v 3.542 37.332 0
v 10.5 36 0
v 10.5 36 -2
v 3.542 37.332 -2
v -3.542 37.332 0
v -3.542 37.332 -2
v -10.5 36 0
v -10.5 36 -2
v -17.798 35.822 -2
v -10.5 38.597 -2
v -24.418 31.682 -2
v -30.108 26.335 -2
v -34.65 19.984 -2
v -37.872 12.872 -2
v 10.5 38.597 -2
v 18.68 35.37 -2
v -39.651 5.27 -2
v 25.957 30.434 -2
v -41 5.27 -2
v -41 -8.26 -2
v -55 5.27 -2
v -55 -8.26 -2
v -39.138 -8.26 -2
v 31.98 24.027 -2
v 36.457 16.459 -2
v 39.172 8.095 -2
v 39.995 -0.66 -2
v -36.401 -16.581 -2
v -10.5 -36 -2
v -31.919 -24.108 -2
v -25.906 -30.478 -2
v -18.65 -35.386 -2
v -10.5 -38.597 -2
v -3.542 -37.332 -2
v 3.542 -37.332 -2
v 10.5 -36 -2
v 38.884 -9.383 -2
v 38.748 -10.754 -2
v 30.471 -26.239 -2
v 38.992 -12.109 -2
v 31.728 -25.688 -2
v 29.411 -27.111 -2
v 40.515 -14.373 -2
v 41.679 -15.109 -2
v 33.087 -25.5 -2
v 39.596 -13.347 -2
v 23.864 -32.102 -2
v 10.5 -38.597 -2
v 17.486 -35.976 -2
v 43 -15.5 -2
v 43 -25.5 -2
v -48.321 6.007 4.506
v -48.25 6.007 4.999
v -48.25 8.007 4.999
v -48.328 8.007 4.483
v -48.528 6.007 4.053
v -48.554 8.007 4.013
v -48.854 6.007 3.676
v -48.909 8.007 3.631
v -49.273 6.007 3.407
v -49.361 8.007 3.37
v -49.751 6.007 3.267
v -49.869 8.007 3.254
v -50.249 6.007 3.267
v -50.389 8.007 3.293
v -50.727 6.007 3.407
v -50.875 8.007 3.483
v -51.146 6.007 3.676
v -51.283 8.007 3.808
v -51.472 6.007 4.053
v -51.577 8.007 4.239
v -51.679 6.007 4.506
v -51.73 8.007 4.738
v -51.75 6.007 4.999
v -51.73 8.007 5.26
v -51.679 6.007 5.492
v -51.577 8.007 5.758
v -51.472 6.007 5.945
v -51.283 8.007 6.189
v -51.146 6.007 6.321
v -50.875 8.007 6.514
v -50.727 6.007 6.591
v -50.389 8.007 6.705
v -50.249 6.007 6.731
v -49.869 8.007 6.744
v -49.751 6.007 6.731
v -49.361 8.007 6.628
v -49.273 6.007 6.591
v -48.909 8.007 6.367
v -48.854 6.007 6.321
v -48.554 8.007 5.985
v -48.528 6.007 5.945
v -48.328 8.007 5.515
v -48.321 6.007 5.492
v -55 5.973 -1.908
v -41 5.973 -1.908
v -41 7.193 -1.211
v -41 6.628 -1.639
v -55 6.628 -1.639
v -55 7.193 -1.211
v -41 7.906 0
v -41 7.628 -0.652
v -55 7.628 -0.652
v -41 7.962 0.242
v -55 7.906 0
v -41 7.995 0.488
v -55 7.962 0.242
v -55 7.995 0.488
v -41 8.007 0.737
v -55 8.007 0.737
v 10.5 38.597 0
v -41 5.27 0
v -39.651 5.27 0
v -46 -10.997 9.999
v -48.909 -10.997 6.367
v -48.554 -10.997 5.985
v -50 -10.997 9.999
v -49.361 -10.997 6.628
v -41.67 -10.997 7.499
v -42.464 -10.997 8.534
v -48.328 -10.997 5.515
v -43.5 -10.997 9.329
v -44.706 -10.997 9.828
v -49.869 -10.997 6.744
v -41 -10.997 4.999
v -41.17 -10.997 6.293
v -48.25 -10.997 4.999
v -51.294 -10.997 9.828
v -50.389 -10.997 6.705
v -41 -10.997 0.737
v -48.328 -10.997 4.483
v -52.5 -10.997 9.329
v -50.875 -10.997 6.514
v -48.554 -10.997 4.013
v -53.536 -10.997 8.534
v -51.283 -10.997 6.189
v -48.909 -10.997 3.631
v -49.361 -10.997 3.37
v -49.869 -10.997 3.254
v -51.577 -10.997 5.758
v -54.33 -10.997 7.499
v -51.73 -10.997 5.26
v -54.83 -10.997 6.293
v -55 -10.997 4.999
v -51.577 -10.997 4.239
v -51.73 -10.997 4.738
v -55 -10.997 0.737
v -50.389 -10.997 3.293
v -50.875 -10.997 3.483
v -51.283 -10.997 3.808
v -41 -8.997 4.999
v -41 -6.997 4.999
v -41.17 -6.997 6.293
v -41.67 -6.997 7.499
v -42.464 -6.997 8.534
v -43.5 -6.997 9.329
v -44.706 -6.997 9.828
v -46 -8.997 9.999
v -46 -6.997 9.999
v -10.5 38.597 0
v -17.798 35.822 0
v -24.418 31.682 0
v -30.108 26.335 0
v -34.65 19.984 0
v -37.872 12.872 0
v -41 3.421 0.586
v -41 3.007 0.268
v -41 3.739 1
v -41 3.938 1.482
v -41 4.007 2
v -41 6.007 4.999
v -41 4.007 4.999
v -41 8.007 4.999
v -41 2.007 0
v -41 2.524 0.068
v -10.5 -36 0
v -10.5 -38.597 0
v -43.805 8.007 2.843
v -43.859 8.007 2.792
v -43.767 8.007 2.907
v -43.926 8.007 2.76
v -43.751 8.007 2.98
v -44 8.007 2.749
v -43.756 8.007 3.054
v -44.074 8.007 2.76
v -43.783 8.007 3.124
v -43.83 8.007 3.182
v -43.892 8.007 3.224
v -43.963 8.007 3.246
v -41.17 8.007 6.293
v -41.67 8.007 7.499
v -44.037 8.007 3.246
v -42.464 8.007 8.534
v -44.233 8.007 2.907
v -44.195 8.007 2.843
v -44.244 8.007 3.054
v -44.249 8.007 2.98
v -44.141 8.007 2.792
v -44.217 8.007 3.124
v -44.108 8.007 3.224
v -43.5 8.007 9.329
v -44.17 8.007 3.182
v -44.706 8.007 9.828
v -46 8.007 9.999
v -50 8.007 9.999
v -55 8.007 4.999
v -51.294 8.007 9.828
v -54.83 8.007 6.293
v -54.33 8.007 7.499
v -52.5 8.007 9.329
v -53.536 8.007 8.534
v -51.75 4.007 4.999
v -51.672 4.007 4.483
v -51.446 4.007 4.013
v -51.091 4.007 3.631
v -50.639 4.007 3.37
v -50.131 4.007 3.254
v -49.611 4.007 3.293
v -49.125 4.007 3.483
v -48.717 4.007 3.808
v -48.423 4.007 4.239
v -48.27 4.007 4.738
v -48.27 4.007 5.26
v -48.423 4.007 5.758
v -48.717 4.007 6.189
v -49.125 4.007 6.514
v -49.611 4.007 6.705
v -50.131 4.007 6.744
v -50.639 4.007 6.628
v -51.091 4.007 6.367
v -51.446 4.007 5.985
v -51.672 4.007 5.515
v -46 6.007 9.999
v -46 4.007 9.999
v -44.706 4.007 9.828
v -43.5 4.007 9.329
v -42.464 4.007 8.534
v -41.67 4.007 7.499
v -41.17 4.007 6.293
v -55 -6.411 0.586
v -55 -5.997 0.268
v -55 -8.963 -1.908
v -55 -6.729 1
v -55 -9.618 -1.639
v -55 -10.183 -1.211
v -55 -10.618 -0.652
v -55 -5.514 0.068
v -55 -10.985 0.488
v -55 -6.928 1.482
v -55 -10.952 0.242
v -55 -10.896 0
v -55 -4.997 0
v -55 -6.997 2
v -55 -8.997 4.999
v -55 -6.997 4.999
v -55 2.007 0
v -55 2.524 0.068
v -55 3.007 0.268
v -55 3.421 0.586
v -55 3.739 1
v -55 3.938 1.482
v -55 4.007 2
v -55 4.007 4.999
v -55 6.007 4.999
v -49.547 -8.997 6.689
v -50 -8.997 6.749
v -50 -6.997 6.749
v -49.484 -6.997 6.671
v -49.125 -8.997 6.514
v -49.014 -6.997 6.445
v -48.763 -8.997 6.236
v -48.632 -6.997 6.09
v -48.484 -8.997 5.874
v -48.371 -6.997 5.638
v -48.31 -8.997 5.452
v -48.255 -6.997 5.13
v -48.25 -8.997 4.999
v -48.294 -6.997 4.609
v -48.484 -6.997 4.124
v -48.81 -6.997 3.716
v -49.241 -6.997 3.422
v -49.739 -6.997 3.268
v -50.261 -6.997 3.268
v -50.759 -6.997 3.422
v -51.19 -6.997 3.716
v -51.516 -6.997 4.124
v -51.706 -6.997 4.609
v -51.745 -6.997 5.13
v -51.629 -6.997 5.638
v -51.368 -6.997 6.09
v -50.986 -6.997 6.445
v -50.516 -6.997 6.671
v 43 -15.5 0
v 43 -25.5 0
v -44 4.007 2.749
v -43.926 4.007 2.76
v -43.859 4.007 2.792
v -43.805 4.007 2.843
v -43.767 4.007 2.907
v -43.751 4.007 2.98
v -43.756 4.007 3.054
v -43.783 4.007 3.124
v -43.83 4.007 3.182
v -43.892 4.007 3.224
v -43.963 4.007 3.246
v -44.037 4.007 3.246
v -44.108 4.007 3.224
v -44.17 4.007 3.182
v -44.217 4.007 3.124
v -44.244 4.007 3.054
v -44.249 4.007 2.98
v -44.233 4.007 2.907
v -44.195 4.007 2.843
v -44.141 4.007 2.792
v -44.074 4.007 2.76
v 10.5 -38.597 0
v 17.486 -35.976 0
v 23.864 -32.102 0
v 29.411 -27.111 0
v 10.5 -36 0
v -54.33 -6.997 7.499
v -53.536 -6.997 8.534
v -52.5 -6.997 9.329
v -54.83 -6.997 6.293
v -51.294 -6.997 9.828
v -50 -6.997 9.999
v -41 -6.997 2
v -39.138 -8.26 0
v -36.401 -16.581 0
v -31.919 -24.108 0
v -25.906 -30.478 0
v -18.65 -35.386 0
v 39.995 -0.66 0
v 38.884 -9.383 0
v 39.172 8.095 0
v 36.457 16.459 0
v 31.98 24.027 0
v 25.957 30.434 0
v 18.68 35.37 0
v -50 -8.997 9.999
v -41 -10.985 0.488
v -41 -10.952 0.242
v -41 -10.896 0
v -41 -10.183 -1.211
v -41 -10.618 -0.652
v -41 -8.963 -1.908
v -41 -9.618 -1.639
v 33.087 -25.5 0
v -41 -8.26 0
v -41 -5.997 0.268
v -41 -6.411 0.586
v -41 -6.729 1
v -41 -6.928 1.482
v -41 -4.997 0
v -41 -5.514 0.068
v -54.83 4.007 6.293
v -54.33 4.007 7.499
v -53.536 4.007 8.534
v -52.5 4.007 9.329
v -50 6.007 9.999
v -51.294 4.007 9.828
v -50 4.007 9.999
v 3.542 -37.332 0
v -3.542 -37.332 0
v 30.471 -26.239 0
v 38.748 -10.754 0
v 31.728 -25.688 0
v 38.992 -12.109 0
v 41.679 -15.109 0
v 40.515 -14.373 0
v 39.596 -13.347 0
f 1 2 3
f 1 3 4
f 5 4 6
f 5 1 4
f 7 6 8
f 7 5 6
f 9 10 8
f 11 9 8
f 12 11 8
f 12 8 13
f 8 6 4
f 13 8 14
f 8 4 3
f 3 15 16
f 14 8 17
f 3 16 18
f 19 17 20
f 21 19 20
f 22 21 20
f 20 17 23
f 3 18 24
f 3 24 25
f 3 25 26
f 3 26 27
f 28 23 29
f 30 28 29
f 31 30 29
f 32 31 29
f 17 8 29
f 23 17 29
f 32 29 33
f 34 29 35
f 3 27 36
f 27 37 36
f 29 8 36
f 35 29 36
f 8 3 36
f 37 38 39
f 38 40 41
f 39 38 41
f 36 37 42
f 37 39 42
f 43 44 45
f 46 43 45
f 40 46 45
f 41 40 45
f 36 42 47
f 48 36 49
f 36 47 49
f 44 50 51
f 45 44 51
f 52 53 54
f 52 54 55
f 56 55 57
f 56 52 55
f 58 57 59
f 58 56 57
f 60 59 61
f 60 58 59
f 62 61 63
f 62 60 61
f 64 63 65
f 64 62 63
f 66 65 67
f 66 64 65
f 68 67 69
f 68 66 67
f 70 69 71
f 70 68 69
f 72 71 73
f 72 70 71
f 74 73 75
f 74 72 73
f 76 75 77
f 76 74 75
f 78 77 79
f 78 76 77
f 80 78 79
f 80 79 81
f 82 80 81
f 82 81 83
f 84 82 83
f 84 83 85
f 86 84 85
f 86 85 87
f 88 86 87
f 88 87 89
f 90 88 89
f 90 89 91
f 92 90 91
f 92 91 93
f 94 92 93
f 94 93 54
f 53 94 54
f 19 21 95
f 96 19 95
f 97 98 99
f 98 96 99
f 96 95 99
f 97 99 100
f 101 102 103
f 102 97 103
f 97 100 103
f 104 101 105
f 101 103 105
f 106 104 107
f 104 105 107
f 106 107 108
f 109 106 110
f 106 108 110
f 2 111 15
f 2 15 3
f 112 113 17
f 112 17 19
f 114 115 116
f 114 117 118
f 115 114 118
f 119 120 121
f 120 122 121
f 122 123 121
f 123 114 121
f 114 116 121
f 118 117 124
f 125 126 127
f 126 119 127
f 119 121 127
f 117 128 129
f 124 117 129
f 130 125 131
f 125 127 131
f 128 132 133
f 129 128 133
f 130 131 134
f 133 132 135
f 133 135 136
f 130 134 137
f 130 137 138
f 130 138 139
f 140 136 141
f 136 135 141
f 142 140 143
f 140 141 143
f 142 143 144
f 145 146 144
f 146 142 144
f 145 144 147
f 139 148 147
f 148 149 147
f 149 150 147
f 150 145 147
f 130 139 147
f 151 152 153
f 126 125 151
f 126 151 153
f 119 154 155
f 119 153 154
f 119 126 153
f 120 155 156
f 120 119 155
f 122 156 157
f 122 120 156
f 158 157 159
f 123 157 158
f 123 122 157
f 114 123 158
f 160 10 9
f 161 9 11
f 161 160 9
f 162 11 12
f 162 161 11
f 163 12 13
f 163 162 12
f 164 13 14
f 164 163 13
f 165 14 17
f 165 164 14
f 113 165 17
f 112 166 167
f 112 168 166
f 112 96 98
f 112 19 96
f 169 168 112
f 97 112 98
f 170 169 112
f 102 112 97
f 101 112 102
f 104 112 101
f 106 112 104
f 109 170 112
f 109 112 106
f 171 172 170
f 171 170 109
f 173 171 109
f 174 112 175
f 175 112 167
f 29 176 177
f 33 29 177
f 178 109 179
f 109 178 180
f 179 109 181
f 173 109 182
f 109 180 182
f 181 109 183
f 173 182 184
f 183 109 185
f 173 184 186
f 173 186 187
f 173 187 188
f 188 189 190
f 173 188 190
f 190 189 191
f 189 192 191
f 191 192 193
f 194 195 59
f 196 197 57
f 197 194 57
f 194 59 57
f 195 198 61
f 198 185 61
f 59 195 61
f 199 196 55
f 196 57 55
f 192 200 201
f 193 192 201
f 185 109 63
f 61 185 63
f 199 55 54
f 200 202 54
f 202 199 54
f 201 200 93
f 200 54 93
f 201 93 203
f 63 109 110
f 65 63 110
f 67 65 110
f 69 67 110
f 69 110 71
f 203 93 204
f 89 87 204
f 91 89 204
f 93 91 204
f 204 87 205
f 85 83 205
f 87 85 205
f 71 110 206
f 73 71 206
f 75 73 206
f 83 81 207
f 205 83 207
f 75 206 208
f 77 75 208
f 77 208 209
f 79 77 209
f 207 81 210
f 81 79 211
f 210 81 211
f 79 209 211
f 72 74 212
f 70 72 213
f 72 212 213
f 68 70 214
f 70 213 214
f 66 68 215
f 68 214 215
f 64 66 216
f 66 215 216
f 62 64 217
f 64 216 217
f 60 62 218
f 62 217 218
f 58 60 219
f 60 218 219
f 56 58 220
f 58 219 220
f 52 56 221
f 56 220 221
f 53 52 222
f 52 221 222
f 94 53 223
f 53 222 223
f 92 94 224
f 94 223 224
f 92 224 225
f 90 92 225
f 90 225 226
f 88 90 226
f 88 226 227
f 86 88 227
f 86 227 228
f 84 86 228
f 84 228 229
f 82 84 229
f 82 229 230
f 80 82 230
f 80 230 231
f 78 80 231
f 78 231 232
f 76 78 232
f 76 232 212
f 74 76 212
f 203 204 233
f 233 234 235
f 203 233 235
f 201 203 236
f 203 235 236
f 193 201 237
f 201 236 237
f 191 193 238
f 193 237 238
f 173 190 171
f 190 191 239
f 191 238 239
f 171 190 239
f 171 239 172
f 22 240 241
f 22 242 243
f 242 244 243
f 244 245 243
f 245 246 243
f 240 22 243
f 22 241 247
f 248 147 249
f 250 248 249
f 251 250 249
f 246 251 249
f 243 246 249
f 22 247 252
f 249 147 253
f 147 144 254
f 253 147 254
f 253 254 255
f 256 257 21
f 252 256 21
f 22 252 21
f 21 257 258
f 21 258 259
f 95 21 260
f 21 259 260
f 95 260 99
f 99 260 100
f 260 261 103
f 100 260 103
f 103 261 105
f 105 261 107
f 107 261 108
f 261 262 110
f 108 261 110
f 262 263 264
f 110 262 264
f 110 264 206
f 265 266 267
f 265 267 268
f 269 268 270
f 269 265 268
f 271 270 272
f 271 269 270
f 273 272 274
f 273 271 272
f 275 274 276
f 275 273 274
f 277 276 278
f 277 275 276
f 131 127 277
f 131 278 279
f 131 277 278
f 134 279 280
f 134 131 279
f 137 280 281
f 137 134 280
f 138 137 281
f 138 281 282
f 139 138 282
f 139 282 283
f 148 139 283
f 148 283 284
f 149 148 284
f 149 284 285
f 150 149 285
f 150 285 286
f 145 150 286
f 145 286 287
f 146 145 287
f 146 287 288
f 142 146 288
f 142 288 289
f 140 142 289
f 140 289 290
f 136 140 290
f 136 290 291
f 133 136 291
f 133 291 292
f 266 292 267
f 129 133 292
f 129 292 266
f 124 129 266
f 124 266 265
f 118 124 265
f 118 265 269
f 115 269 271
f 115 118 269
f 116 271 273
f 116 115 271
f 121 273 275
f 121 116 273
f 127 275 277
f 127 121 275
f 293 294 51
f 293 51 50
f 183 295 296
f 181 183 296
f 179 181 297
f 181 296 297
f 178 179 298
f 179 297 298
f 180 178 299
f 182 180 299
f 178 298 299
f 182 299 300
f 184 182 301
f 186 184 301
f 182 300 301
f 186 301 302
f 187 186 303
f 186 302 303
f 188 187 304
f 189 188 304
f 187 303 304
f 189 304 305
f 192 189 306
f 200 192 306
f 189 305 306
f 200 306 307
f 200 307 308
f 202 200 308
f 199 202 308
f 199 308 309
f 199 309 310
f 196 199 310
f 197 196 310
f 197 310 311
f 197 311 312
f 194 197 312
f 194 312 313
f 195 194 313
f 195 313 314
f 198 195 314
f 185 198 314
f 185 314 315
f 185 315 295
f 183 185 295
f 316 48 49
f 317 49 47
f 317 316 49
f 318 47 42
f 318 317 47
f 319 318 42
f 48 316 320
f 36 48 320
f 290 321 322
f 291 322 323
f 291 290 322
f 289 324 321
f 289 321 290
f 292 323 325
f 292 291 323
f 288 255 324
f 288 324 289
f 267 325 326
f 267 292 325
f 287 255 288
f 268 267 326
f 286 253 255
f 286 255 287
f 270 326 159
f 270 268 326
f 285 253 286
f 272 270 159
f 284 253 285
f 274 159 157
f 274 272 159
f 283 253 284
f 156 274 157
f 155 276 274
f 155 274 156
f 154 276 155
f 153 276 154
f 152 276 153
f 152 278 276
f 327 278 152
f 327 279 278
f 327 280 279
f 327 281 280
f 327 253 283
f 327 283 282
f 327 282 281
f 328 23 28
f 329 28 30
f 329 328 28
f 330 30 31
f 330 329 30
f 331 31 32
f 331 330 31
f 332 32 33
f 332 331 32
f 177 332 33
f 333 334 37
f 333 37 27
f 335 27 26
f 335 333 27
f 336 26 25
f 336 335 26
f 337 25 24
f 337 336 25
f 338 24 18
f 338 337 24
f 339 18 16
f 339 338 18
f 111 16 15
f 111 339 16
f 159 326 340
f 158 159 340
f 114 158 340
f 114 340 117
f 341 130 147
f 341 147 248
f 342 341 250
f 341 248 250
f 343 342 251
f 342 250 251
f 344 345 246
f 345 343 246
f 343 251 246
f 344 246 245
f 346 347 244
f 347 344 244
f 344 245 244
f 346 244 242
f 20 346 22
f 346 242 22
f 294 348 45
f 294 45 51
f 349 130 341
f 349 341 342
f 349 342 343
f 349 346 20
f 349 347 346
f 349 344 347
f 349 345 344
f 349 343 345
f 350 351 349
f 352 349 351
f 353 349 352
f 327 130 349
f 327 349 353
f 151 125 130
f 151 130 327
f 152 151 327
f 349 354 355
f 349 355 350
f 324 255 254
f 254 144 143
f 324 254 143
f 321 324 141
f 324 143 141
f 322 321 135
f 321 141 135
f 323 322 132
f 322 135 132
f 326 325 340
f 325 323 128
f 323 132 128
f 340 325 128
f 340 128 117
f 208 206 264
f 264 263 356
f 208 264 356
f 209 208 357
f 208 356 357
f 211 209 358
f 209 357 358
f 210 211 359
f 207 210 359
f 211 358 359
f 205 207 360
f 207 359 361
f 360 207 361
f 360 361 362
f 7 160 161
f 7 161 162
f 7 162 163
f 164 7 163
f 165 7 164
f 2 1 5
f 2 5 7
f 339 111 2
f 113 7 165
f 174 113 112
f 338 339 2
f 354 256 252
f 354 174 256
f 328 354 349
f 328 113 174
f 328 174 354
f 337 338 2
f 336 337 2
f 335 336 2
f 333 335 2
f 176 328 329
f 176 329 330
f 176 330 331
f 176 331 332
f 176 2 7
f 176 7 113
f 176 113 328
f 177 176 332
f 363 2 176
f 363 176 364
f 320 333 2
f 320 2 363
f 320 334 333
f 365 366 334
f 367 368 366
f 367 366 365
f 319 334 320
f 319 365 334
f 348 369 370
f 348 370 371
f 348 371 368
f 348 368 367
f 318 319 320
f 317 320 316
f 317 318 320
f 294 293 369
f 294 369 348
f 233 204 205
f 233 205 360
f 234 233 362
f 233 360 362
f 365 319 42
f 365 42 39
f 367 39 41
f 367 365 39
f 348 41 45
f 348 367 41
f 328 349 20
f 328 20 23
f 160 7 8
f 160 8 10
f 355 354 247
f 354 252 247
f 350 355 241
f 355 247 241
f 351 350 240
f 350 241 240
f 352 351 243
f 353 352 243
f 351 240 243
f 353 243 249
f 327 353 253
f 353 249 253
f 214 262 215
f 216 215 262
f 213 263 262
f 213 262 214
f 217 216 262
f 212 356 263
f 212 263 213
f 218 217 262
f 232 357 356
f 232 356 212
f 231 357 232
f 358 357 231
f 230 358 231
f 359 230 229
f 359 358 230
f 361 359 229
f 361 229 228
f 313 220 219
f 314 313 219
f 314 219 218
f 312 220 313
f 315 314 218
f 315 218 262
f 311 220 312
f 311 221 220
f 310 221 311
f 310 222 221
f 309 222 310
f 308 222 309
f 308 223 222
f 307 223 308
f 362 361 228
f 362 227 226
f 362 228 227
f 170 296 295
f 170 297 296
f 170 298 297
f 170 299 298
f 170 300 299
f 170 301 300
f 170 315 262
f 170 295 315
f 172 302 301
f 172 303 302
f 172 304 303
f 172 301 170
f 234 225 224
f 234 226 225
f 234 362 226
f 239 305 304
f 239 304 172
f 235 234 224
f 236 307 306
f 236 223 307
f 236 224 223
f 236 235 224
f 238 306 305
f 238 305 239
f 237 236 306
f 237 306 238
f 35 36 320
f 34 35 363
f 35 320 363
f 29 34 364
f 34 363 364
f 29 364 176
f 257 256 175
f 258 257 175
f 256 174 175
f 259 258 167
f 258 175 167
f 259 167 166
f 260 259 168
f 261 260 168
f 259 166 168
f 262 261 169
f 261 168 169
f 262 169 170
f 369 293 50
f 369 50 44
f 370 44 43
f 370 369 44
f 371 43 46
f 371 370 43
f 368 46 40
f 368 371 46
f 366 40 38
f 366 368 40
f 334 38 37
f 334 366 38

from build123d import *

# Parameters (mm, degrees)
SKETCH1_R                  = 1.7500000000000038
SKETCH1_R_2                = 1.7500000000000033
BASE_FLANGE1_DEPTH         = 2
SKETCHED_START             = -55
SKETCHED_BEND1_DEPTH       = 14
SKETCHED_START_2           = -48.2499999
SKETCHED_BEND1_2_DEPTH     = 7.2499999
SKETCHED_BEND1_3_DEPTH     = 3.2499999
SKETCHED_START_3           = -51.7500001
SKETCHED_BEND1_4_DEPTH     = 3.5000002
SKETCHED_START_4           = -10.9966
SKETCHED_BEND1_5_OUTLINE_R = 1.75
SKETCHED_BEND1_5_DEPTH     = 19.0032
FILLET1_R                  = 5
CUT_EXTRUDE2_REACH         = 70.738
FILLET2_R                  = 5
BOSS_EXTRUDE1_START        = 2
SKETCH9_R                  = 1.7500000000000036
BOSS_EXTRUDE1_DEPTH        = 2
CUT_EXTRUDE1_REACH         = 72.286
SKETCH7_R                  = 0.24999999999999958
SKETCH10_R                 = 1.7500000000000036
BOSS_EXTRUDE2_DEPTH        = 2
FILLET3_R                  = 2


with BuildPart() as part:
    # Base-Flange1: sheet metal written as solids
    # Sketch1 → Base-Flange1 (new body)
    with BuildSketch(Plane.XY):
        with BuildLine():
            Line((-39.65131901967449, 5.269999999999999), (-40.999999999999986, 5.270000000000006))
            Line((-40.999999999999986, 5.270000000000006), (-40.999999999999986, 17.26000000000001))
            Line((-40.999999999999986, 17.26000000000001), (-54.999999999999986, 17.260000000000012))
            Line((-54.999999999999986, 17.260000000000012), (-54.99999999999998, -20.25))
            Line((-54.99999999999998, -20.25), (-40.99999999999998, -20.250000000000004))
            Line((-40.99999999999998, -20.250000000000004), (-40.999999999999986, -8.26))
            Line((-40.999999999999986, -8.26), (-39.13786401938665, -8.26))
            ThreePointArc((-39.13786401938665, -8.26), (-9.571278660785763, -38.83800490238379), (30.81801421246995, -25.500000000000004))
            Line((30.81801421246995, -25.500000000000004), (43, -25.5))
            Line((43, -25.5), (43, -15.499999999999998))
            Line((43, -15.499999999999998), (36.874788134984584, -15.499999999999996))
            ThreePointArc((36.874788134984584, -15.499999999999996), (10.47738068118216, 38.60342593684647), (-39.65131901967449, 5.269999999999999))
        make_face()
        with Locations((-50, 12.260000000000014)):
            Circle(SKETCH1_R, mode=Mode.SUBTRACT)
        with Locations(Location((-49.999999999999986, -15.250000000000002, 0), (0, 0, 180))):
            Circle(SKETCH1_R_2, mode=Mode.SUBTRACT)
    extrude(amount=-BASE_FLANGE1_DEPTH)

    # Sketched Bend1: read off the stored shape, not the designer's step
    # Sketched Bend1 outline → Sketched Bend1 (cut)
    with BuildSketch(Plane.YZ.offset(SKETCHED_START)):
        with BuildLine():
            Line((-20.25, -2), (-8.26, -2))
            ThreePointArc((-8.26, -2), (-9.914267209, -1.443395312), (-10.895602398, 0))
            Line((-10.895602398, 0), (-20.25, 0))
            Line((-20.25, 0), (-20.25, -2))
        make_face()
        with BuildLine():
            ThreePointArc((7.905602398, 0), (6.924267209, -1.443395312), (5.27, -2))
            Line((5.27, -2), (17.26, -2))
            Line((17.26, -2), (17.26, 0))
            Line((17.26, 0), (7.905602398, 0))
        make_face()
    extrude(amount=SKETCHED_BEND1_DEPTH, mode=Mode.SUBTRACT)

    # Sketched Bend1 2 outline → Sketched Bend1 2 (add)
    with BuildSketch(Plane.YZ.offset(SKETCHED_START_2)):
        with BuildLine():
            ThreePointArc((-10.9966, 0.7366), (-10.971233029, 0.364854094), (-10.895602398, 0))
            Line((-10.895602398, 0), (-8.26, 0))
            ThreePointArc((-8.26, 0), (-8.780854855, 0.215745145), (-8.9966, 0.7366))
            Line((-8.9966, 0.7366), (-8.9966, 9.998755099))
            Line((-8.9966, 9.998755099), (-10.9966, 9.998755099))
            Line((-10.9966, 9.998755099), (-10.9966, 0.7366))
        make_face()
        with BuildLine():
            Line((5.27, 0), (7.905602398, 0))
            ThreePointArc((7.905602398, 0), (7.981233029, 0.364854094), (8.0066, 0.7366))
            Line((8.0066, 0.7366), (8.0066, 9.998755099))
            Line((8.0066, 9.998755099), (6.0066, 9.998755099))
            Line((6.0066, 9.998755099), (6.0066, 0.7366))
            ThreePointArc((6.0066, 0.7366), (5.790854855, 0.215745145), (5.27, 0))
        make_face()
    extrude(amount=SKETCHED_BEND1_2_DEPTH)

    # Sketched Bend1 3 outline → Sketched Bend1 3 (add)
    with BuildSketch(Plane.YZ.offset(SKETCHED_START)):
        with BuildLine():
            ThreePointArc((-10.9966, 0.7366), (-10.971233029, 0.364854094), (-10.895602398, 0))
            Line((-10.895602398, 0), (-8.26, 0))
            ThreePointArc((-8.26, 0), (-8.780854855, 0.215745145), (-8.9966, 0.7366))
            Line((-8.9966, 0.7366), (-8.9966, 9.998755099))
            Line((-8.9966, 9.998755099), (-10.9966, 9.998755099))
            Line((-10.9966, 9.998755099), (-10.9966, 0.7366))
        make_face()
        with BuildLine():
            Line((5.27, 0), (7.905602398, 0))
            ThreePointArc((7.905602398, 0), (7.981233029, 0.364854094), (8.0066, 0.7366))
            Line((8.0066, 0.7366), (8.0066, 9.998755099))
            Line((8.0066, 9.998755099), (6.0066, 9.998755099))
            Line((6.0066, 9.998755099), (6.0066, 0.7366))
            ThreePointArc((6.0066, 0.7366), (5.790854855, 0.215745145), (5.27, 0))
        make_face()
    extrude(amount=SKETCHED_BEND1_3_DEPTH)

    # Sketched Bend1 4 outline → Sketched Bend1 4 (add)
    with BuildSketch(Plane.YZ.offset(SKETCHED_START_3)):
        with BuildLine():
            ThreePointArc((6.0066, 0.7366), (5.790854855, 0.215745145), (5.27, 0))
            Line((5.27, 0), (7.905602398, 0))
            ThreePointArc((7.905602398, 0), (7.981233029, 0.364854094), (8.0066, 0.7366))
            Line((8.0066, 0.7366), (8.0066, 9.998755099))
            Line((8.0066, 9.998755099), (6.0066, 9.998755099))
            Line((6.0066, 9.998755099), (6.0066, 0.7366))
        make_face()
        with BuildLine():
            ThreePointArc((-10.9966, 0.7366), (-10.971233029, 0.364854094), (-10.895602398, 0))
            Line((-10.895602398, 0), (-8.26, 0))
            ThreePointArc((-8.26, 0), (-8.780854855, 0.215745145), (-8.9966, 0.7366))
            Line((-8.9966, 0.7366), (-8.9966, 9.998755099))
            Line((-8.9966, 9.998755099), (-10.9966, 9.998755099))
            Line((-10.9966, 9.998755099), (-10.9966, 0.7366))
        make_face()
    extrude(amount=SKETCHED_BEND1_4_DEPTH)

    # Sketched Bend1 5 outline → Sketched Bend1 5 (cut)
    with BuildSketch(Plane(origin=(0, 0, 0), x_dir=(1, 0, 0), z_dir=(0, 1, 0)).offset(SKETCHED_START_4)):
        with Locations((-50, -4.998755099)):
            Circle(SKETCHED_BEND1_5_OUTLINE_R)
    extrude(amount=SKETCHED_BEND1_5_DEPTH, mode=Mode.SUBTRACT)

    # Fillet1
    # the kernel refuses this fillet: 5 mm, written as the material it adds along each edge
    with BuildSketch(Plane(origin=(30.818014212469954, -25.500000000000007, 0), x_dir=(-0.6578741358493351, -0.7531278917823256, 0), z_dir=(0, 0, -1))) as fillet1_piece_1:
        with BuildLine():
            CenterArc((2.272928109865178, -4.998212067114161), FILLET1_R, 91.53229073869478, 47.329766128742406)
            Line((-1.49271134904645, -1.7088413878674857), (-1.5680241382246838, -1.6430539742825514))
            Line((-1.5680241382246838, -1.6430539742825514), (-0.07531278917823364, 0.06578741358493444))
            Line((-0.07531278917823364, 0.06578741358493444), (0.00267403307043032, 0.09996424134228217))
            ThreePointArc((0.00267403307043032, 0.09996424134228217), (1.0696132281718547, 0.0856965369132901), (2.1365524232732724, 0.0999642413422845))
            Line((2.1365524232732724, 0.0999642413422845), (2.139226456343701, -1e-16))
        make_face()
    extrude(amount=2)
    with BuildSketch(Plane(origin=(36.874788134984584, -15.499999999999996, 0), x_dir=(0.3120481831654017, 0.9500662773634121, 0), z_dir=(0, 0, -1))) as fillet1_piece_2:
        with BuildLine():
            CenterArc((6.841047896129056, 4.983779941379127), FILLET1_R, 170.3798521279212, 95.00382355421686)
            Line((1.911361233981272, 5.8193572346573905), (1.8127675007383173, 5.836068780522958))
            ThreePointArc((1.8127675007383173, 5.836068780522958), (0.8606739892542704, 2.9408834356452394), (-0.09500662773634087, 0.03120481831654006))
            Line((-0.09500662773634087, 0.03120481831654006), (0.00804829164250585, -0.09967559882757966))
            ThreePointArc((0.00804829164250585, -0.09967559882757966), (3.219316657001906, 0.02976046896695109), (6.430585022361307, -0.09967559882758435))
            Line((6.430585022361307, -0.09967559882758435), (6.438633314003813, 2.9e-16))
        make_face()
    extrude(amount=2)

    # Sketch8 → Cut-Extrude2 (cut, up to next)
    with BuildSketch(Plane.XY, mode=Mode.PRIVATE) as cut_extrude2_sk1:
        with BuildLine():
            Line((10.500000000000004, -38.59727969689056), (10.50000000000001, -36))
            ThreePointArc((10.500000000000012, -36), (4.4e-16, -37.5), (-10.50000000000001, -36))
            Line((-10.50000000000001, -36), (-10.499999999999996, -38.59727969689056))
            ThreePointArc((-10.499999999999998, -38.59727969689057), (2.22e-15, -40.00000000000001), (10.499999999999998, -38.59727969689057))
        make_face()
    cut_extrude2_tool1 = extrude(cut_extrude2_sk1.sketch, amount=-CUT_EXTRUDE2_REACH, mode=Mode.PRIVATE) & part.part
    # Sketch8 → Cut-Extrude2 (cut, up to next)
    with BuildSketch(Plane.XY, mode=Mode.PRIVATE) as cut_extrude2_sk2:
        with BuildLine():
            ThreePointArc((10.5, 35.99999999999999), (2.3e-15, 37.49999999999999), (-10.5, 35.99999999999999))
            Line((-10.5, 35.99999999999999), (-10.500000000000004, 38.59727969689055))
            ThreePointArc((-10.500000000000004, 38.59727969689055), (2.45e-15, 39.99999999999999), (10.499999999999996, 38.59727969689055))
            Line((10.499999999999996, 38.59727969689055), (10.5, 35.99999999999999))
        make_face()
    cut_extrude2_tool2 = extrude(cut_extrude2_sk2.sketch, amount=-CUT_EXTRUDE2_REACH, mode=Mode.PRIVATE) & part.part
    add(cut_extrude2_tool1.solids().sort_by_distance((0, -38.265011, 0))[0], mode=Mode.SUBTRACT)
    add(cut_extrude2_tool2.solids().sort_by_distance((0, 38.265011, 0))[0], mode=Mode.SUBTRACT)

    # Fillet2
    fillet2_edges = [part.edges().sort_by_distance(p)[0] for p in [
        (-55, 7.006600000000001, 9.998755099),
        (-41, 7.006600000000001, 9.998755099),
        (-41, -9.9966, 9.998755099),
        (-55, -9.9966, 9.998755099),
    ]]
    fillet(fillet2_edges, radius=FILLET2_R)

    # Sketch9 → Boss-Extrude1 (add)
    with BuildSketch(Plane.XZ.offset(-6.006600000000028).offset(BOSS_EXTRUDE1_START)):
        with BuildLine():
            Line((-54.999999999999986, 0.7365999999999726), (-54.999999999999986, -1.843e-14))
            Line((-54.999999999999986, -1.843e-14), (-40.999999999999986, -1.843e-14))
            Line((-40.999999999999986, -1.843e-14), (-40.999999999999986, 0.7365999999999743))
            Line((-40.999999999999986, 0.7365999999999743), (-40.999999999999986, 4.998755098887944))
            ThreePointArc((-40.999999999999986, 4.998755098887944), (-42.46446609406725, 8.534289004820682), (-45.999999999999986, 9.998755098887946))
            Line((-45.999999999999986, 9.998755098887946), (-49.999999999999986, 9.998755098887948))
            ThreePointArc((-49.999999999999986, 9.998755098887948), (-53.53553390593273, 8.53428900482069), (-54.999999999999986, 4.99875509888795))
            Line((-54.999999999999986, 4.99875509888795), (-54.999999999999986, 0.7365999999999726))
        make_face()
        with Locations(Location((-50, 4.998755098887954, 0), (0, 0, 180))):
            Circle(SKETCH9_R, mode=Mode.SUBTRACT)
    extrude(amount=-BOSS_EXTRUDE1_DEPTH)

    # Sketch7 → Cut-Extrude1 (cut, up to next)
    with BuildSketch(Plane.XZ.offset(-4.006600000000027), mode=Mode.PRIVATE) as cut_extrude1_sk1:
        with Locations(Location((-44.00000000000001, 2.998755098887952, 0), (0, 0, 270))):
            Circle(SKETCH7_R)
    cut_extrude1_tool1 = extrude(cut_extrude1_sk1.sketch, amount=-CUT_EXTRUDE1_REACH, mode=Mode.PRIVATE) & part.part
    add(cut_extrude1_tool1.solids().sort_by_distance((-44, 4.0066, 2.998755))[0], mode=Mode.SUBTRACT)

    # Sketch10 → Boss-Extrude2 (add)
    with BuildSketch(Plane(origin=(0, -8.996599999999987, 3.141e-14), x_dir=(1, 0, 0), z_dir=(0, 1, -3.49e-15))):
        with BuildLine():
            Line((-54.99999999999998, 2.884e-14), (-54.99999999999998, -0.7365999999999777))
            Line((-54.99999999999998, -0.7365999999999777), (-54.99999999999998, -4.99875509888795))
            ThreePointArc((-54.99999999999998, -4.99875509888795), (-53.535533905932716, -8.534289004820696), (-49.99999999999997, -9.998755098887964))
            Line((-49.99999999999997, -9.998755098887964), (-45.99999999999998, -9.998755098887965))
            ThreePointArc((-45.99999999999998, -9.998755098887965), (-42.46446609406724, -8.534289004820701), (-40.99999999999998, -4.998755098887962))
            Line((-40.99999999999998, -4.998755098887962), (-40.999999999999986, -0.7365999999999864))
            Line((-40.999999999999986, -0.7365999999999864), (-40.999999999999986, 2.884e-14))
            Line((-40.999999999999986, 2.884e-14), (-54.99999999999998, 2.884e-14))
        make_face()
        with Locations(Location((-49.999999999999986, -4.9987550988879645, 0), (0, 0, 270))):
            Circle(SKETCH10_R, mode=Mode.SUBTRACT)
    extrude(amount=BOSS_EXTRUDE2_DEPTH)

    # Fillet3
    fillet3_edges = [part.edges().sort_by_distance(p)[0] for p in [
        (-47.999999999999986, 4.006600000000022, -4.44e-15),
        (-47.999999999999986, -6.996599999999987, -4.41e-15),
    ]]
    fillet(fillet3_edges, radius=FILLET3_R)


solid = part.part
